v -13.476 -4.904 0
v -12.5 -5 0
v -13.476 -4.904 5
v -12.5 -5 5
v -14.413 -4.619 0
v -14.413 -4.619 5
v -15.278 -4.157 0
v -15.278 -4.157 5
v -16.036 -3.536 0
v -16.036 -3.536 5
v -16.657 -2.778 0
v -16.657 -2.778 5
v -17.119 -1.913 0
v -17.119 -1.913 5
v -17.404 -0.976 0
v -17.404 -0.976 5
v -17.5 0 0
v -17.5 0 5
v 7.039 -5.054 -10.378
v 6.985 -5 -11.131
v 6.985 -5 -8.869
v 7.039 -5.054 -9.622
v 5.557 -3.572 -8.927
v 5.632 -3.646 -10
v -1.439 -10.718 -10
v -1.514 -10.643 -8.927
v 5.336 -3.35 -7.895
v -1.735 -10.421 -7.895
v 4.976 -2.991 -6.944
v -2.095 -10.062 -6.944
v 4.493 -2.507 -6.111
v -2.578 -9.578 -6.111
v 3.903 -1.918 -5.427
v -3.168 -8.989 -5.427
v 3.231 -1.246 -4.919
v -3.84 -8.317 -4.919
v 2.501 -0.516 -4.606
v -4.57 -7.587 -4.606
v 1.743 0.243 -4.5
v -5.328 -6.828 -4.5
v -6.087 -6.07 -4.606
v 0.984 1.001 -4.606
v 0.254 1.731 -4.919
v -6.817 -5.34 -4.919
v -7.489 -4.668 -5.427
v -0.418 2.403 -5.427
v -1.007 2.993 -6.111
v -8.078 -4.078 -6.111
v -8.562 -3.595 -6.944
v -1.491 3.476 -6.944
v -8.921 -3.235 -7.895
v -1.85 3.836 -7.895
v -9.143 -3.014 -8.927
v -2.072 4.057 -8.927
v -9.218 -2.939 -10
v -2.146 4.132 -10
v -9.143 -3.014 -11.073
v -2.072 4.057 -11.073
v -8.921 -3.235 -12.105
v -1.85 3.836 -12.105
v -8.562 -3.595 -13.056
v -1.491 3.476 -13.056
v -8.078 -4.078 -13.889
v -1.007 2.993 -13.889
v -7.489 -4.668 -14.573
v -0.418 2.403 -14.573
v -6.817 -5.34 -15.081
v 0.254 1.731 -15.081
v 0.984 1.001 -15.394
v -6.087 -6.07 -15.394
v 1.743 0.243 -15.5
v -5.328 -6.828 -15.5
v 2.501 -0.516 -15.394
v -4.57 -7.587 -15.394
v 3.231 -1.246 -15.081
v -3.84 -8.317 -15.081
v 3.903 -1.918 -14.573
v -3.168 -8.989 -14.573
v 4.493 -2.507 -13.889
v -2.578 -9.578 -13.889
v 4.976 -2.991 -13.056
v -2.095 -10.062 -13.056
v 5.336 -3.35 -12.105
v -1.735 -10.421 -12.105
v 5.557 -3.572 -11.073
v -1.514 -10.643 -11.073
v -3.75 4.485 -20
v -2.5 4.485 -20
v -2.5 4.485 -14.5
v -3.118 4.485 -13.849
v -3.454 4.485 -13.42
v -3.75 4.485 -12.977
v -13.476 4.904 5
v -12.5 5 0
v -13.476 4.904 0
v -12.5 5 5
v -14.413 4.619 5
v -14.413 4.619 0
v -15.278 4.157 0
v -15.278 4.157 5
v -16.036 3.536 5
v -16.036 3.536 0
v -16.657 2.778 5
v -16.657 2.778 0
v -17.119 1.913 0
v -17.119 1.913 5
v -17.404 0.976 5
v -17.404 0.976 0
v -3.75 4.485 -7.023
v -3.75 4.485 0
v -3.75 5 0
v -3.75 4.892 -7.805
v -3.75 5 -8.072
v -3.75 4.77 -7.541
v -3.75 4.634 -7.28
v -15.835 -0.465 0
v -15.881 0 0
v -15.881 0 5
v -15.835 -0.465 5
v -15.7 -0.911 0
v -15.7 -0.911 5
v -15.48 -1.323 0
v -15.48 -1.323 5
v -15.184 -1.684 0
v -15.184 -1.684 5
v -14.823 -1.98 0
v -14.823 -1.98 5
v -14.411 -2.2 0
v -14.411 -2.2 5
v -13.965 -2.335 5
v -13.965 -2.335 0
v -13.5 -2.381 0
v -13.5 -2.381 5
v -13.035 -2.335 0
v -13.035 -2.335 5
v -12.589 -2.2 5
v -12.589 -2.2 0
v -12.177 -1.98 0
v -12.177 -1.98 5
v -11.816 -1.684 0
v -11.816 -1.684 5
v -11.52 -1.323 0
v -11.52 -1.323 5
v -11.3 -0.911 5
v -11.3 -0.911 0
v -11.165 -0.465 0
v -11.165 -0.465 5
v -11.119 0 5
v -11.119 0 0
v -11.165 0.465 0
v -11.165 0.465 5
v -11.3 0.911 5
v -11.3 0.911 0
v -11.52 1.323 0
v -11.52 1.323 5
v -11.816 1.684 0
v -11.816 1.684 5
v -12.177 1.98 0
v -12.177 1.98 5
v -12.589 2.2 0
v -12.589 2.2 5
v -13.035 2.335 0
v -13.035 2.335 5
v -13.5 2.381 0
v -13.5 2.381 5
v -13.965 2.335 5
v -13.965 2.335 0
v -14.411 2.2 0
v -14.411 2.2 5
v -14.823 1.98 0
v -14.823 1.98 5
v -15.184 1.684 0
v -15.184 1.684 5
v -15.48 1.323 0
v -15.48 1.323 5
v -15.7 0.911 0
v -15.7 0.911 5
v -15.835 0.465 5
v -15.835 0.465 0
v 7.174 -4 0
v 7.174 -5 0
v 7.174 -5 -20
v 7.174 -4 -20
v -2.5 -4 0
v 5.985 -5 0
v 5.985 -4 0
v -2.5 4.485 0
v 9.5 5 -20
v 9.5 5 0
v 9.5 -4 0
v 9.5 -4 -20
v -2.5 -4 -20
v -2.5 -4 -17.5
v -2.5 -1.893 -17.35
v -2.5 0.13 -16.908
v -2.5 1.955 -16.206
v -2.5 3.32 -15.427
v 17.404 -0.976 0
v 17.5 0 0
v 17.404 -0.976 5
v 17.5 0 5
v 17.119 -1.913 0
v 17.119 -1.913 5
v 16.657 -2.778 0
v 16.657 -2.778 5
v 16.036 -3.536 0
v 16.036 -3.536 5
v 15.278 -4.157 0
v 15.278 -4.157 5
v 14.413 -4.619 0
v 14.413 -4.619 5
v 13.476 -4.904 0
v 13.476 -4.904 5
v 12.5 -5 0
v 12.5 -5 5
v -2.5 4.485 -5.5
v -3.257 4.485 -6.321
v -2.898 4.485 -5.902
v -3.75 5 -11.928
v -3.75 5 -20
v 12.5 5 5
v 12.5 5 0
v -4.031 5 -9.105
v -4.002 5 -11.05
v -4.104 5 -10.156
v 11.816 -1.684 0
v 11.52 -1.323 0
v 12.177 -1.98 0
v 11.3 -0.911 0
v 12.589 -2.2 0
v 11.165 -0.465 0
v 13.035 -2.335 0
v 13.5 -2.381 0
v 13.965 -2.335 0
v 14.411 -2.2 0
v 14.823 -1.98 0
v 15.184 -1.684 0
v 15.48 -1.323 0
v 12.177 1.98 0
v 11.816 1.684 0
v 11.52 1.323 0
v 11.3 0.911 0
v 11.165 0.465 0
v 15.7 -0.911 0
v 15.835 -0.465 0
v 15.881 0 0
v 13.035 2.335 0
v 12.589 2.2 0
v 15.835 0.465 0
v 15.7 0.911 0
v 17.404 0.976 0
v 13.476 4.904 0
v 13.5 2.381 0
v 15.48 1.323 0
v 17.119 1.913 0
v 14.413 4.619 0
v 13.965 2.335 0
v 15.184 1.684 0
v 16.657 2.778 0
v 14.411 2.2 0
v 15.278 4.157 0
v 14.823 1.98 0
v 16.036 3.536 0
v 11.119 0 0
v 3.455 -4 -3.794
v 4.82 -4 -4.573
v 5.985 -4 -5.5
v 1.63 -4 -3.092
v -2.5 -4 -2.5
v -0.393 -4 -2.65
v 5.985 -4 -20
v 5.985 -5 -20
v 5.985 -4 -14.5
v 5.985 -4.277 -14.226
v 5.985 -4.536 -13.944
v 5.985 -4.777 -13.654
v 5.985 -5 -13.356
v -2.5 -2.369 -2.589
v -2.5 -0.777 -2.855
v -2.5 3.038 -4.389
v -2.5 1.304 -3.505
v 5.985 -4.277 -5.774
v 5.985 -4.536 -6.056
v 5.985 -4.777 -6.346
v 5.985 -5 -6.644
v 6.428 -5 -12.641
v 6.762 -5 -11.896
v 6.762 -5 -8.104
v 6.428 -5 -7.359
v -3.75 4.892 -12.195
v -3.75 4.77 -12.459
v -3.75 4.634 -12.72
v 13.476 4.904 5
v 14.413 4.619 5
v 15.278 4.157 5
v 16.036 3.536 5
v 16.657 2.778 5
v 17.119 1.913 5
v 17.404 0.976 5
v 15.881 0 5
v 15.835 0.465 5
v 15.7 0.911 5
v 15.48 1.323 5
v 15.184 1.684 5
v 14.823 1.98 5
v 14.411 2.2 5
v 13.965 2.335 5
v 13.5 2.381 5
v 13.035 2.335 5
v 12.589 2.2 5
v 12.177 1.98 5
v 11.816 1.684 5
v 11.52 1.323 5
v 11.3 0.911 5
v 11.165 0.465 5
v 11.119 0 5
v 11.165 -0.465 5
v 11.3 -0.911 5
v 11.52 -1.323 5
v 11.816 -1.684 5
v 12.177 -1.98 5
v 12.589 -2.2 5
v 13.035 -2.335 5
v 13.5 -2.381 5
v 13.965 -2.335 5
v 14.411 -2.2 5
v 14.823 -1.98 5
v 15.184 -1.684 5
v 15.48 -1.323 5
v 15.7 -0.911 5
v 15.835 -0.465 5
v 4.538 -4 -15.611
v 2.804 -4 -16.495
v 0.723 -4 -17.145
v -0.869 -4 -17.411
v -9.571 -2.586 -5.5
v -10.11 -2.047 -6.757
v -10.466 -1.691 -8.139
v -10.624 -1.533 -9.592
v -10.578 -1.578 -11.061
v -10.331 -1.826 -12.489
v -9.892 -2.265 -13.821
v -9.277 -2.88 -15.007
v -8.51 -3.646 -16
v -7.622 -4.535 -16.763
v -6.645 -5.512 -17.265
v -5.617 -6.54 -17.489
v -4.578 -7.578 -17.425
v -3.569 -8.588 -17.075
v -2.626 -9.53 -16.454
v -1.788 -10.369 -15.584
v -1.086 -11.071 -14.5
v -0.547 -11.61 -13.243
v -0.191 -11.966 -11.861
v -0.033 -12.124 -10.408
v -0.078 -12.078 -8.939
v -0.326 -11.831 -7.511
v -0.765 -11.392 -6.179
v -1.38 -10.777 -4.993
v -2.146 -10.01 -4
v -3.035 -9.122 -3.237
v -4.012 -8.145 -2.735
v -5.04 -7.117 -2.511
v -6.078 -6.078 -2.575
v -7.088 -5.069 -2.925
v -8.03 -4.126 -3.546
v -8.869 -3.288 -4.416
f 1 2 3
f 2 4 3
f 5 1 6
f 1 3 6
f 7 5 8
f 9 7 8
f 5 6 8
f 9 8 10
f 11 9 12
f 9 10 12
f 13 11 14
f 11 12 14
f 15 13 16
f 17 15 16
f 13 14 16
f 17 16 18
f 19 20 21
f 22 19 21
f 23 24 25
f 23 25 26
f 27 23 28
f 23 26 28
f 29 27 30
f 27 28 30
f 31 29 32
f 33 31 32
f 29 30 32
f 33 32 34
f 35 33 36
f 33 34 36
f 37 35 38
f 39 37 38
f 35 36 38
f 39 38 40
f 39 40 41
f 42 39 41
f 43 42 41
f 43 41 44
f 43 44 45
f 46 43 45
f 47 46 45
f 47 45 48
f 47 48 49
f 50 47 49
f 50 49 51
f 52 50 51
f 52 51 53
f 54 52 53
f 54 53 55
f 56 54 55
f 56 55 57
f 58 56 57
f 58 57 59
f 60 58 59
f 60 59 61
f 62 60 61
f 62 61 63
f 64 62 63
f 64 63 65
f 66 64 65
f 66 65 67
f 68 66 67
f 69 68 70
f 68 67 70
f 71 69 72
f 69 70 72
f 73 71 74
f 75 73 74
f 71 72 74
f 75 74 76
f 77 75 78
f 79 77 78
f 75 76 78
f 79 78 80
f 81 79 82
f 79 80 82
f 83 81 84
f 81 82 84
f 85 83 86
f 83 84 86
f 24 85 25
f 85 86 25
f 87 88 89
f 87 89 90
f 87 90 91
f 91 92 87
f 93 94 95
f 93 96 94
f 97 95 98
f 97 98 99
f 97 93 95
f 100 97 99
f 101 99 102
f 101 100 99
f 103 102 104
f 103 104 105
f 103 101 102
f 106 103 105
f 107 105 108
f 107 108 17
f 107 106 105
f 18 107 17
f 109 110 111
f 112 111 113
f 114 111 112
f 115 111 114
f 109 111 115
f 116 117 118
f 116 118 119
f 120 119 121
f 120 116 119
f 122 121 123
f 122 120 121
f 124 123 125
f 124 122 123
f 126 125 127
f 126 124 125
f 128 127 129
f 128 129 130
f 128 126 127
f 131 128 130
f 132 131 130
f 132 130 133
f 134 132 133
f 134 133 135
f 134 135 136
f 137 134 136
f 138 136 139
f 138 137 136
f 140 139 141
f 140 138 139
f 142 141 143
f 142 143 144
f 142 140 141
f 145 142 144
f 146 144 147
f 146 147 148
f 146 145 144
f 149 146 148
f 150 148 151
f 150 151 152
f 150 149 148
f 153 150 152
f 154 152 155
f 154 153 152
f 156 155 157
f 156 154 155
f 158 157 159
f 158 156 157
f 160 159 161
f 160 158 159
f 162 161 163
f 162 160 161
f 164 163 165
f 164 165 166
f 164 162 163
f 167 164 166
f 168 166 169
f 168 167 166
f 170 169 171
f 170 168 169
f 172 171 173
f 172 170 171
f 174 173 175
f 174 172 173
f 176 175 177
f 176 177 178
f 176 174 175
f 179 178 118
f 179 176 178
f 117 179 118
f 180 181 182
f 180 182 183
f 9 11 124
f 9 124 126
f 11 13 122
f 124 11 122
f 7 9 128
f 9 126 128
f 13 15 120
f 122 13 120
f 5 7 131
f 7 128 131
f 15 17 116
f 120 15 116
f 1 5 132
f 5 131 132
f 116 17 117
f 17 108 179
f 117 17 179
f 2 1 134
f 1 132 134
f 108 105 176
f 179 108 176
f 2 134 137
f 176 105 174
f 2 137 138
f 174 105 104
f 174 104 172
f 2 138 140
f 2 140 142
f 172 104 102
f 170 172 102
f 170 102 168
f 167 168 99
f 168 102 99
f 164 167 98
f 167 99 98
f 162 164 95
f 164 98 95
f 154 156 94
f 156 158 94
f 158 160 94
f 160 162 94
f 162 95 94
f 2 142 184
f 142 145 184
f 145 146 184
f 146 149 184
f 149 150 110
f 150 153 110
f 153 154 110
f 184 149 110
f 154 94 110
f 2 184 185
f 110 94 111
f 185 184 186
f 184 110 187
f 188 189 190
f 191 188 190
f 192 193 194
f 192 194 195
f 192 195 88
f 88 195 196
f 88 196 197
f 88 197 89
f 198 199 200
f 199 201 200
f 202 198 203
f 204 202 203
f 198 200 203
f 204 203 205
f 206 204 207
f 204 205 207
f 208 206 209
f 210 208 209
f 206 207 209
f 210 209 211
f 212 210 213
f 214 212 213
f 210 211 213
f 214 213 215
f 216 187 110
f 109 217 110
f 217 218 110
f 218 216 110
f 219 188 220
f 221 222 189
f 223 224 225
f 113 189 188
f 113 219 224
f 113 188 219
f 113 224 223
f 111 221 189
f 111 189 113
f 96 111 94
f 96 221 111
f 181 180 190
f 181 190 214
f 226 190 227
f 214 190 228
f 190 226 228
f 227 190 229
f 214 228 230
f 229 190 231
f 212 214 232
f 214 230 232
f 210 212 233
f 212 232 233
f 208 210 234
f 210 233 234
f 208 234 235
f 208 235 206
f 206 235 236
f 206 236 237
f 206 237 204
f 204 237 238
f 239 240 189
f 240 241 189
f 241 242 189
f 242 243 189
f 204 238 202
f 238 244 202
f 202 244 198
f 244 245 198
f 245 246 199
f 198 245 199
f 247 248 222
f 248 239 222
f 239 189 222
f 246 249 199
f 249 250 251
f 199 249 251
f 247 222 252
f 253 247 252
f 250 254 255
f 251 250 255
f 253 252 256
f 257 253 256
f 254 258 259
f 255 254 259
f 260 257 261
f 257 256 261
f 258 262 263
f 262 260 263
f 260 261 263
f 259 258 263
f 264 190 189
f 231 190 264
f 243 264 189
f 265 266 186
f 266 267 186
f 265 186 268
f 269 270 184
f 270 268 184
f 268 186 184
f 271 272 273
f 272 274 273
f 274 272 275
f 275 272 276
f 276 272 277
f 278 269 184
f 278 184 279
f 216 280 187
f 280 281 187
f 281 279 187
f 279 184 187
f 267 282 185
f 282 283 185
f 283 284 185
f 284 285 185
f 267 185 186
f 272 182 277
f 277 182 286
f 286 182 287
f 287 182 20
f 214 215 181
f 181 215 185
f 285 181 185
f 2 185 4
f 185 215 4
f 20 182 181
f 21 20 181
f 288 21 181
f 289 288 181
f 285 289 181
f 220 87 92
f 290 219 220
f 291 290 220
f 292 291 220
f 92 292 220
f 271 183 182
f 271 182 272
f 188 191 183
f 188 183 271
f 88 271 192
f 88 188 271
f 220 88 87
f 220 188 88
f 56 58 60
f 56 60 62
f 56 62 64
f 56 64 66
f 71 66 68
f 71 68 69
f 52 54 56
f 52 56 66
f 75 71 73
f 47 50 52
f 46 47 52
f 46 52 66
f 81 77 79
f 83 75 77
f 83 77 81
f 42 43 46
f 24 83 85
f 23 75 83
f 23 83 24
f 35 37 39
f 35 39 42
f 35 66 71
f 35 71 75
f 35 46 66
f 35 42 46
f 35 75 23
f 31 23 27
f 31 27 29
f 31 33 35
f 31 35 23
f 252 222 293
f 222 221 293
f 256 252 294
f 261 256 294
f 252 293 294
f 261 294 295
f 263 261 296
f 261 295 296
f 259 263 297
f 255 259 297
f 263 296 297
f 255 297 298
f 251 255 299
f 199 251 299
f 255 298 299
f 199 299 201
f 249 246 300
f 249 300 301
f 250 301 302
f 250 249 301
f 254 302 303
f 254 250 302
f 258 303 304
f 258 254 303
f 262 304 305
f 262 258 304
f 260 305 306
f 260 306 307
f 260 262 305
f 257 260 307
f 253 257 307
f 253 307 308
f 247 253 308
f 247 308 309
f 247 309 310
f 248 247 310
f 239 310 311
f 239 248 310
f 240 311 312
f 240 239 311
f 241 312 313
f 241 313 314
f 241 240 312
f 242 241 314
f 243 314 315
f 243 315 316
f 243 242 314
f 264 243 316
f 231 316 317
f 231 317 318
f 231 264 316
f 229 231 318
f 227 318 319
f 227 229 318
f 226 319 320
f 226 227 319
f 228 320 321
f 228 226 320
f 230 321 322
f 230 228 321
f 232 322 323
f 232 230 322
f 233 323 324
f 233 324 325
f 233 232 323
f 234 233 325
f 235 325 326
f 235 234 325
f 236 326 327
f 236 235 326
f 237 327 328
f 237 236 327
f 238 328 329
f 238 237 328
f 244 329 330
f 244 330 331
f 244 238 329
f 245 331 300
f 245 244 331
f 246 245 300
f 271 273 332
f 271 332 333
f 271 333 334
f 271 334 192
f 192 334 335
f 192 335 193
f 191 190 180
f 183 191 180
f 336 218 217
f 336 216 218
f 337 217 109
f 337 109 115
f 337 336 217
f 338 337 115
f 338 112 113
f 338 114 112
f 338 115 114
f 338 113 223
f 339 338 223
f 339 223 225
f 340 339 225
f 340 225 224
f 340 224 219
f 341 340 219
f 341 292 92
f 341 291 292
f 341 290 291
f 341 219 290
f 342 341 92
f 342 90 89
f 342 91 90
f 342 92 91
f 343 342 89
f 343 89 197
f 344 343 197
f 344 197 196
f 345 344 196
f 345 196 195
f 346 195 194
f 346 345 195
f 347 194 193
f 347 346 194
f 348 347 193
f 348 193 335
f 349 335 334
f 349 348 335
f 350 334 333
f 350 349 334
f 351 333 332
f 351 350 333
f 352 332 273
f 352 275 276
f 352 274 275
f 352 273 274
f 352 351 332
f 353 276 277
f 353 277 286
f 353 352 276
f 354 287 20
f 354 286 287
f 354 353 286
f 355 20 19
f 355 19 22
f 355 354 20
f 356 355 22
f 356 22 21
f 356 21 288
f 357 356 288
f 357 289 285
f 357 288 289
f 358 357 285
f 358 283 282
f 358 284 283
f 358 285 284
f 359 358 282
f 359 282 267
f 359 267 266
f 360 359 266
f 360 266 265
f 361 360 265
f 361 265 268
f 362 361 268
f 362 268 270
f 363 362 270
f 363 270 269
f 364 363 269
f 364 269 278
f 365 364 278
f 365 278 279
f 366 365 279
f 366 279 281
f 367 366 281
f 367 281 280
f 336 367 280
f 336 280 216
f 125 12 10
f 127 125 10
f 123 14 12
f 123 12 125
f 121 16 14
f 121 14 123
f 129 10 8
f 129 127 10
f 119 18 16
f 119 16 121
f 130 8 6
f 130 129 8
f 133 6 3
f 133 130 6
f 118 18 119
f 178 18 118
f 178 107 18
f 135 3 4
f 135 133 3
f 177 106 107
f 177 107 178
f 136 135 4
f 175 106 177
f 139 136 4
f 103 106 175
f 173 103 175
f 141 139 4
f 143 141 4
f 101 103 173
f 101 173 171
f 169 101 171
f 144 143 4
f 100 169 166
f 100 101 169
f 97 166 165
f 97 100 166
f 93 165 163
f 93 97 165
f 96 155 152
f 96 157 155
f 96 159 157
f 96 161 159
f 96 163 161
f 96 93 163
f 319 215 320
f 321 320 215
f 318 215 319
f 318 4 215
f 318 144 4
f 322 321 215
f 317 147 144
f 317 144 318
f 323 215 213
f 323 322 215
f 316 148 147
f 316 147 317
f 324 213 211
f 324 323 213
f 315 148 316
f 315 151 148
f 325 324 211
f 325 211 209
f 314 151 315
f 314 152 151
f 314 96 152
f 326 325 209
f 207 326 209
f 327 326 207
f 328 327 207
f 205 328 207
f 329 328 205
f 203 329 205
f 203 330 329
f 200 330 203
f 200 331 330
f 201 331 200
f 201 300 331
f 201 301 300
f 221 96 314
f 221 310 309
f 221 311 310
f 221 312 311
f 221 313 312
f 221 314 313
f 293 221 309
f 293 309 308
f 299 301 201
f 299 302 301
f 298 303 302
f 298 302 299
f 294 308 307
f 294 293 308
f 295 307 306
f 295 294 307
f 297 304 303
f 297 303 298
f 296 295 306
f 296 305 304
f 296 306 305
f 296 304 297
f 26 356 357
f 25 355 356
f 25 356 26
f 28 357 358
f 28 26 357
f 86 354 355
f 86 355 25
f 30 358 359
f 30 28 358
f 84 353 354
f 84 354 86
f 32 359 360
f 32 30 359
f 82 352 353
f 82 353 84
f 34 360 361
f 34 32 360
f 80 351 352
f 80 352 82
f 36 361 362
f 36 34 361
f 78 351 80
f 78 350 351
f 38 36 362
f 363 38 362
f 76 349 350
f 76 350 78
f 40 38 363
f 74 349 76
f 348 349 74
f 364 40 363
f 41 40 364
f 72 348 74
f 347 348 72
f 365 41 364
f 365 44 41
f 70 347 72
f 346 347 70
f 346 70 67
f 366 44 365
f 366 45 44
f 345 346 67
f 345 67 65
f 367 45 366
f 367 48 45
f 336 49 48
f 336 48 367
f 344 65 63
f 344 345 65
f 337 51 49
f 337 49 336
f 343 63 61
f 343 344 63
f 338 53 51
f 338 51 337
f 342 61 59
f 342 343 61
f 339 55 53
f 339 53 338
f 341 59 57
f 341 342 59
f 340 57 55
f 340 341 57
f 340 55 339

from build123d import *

# Parameters (mm, degrees)
SKETCH1_W           = 35
SKETCH1_H           = 10
SKETCH1_R           = 2.38125
BOSS_EXTRUDE1_DEPTH = 5
BOSS_EXTRUDE2_DEPTH = 20
SKETCH3_R           = 5.5
CUT_EXTRUDE1_DEPTH  = 6
BOSS_EXTRUDE3_START = 10
SKETCH4_R           = 7.5
SKETCH4_R_2         = 5.5
BOSS_EXTRUDE3_DEPTH = 10
FILLET1_R           = 5
BOSS_EXTRUDE4_START = -20
SKETCH5_W           = 1.25
SKETCH5_H           = 0.514718626
BOSS_EXTRUDE4_DEPTH = 20
SKETCH6_W           = 6.624212501
SKETCH6_H           = 0.612418682
CUT_EXTRUDE2_DEPTH  = 33.839440066
BOSS_EXTRUDE5_START = -20
SKETCH7_W           = 1.18849251
SKETCH7_H           = 1
BOSS_EXTRUDE5_DEPTH = 20


with BuildPart() as part:
    # Sketch1 → Boss-Extrude1 (new body)
    with BuildSketch(Plane.XY):
        Rectangle(SKETCH1_W, SKETCH1_H)
        with Locations((13.5, 0)):
            Circle(SKETCH1_R, mode=Mode.SUBTRACT)
        with Locations(Location((-13.5, 0, 0), (0, 0, 180))):
            Circle(SKETCH1_R, mode=Mode.SUBTRACT)
    extrude(amount=BOSS_EXTRUDE1_DEPTH)

    # Sketch2 → Boss-Extrude2 (add)
    with BuildSketch(Plane(origin=(0, 0, 0), x_dir=(-1, 0, 0), z_dir=(0, 0, -1))):
        Polygon((-9.5, -4), (2.5, -4), (2.5, 4), (2.5, 5), (-9.5, 5), (-9.5, 4), align=None)
    extrude(amount=BOSS_EXTRUDE2_DEPTH)

    # Sketch3 → Cut-Extrude1 (cut)
    with BuildSketch(Plane(origin=(-3.25, -3.25, 0), x_dir=(0, 0, 1), z_dir=(-0.7071067811865488, -0.7071067811865464, 0))):
        with Locations(Location((-10, -1.060660172, 0), (0, 0, 270))):
            Circle(SKETCH3_R)
    extrude(amount=-CUT_EXTRUDE1_DEPTH, mode=Mode.SUBTRACT)

    # Sketch4 → Boss-Extrude3 (add)
    with BuildSketch(Plane(origin=(0.992640687, 0.992640687, 0), x_dir=(0, 0, 1), z_dir=(-0.7071067811865488, -0.7071067811865462, 0)).offset(BOSS_EXTRUDE3_START)):
        with Locations(Location((-10, -1.060660172, 0), (0, 0, 53.130102354))):
            Circle(SKETCH4_R)
        with Locations(Location((-10, -1.060660172, 0), (0, 0, 270))):
            Circle(SKETCH4_R_2, mode=Mode.SUBTRACT)
    extrude(amount=-BOSS_EXTRUDE3_DEPTH)

    # Fillet1
    fillet1_edges = [part.edges().sort_by_distance(p)[0] for p in [
        (17.5, 5, 2.5),
        (17.5, -5, 2.5),
        (-17.5, -5, 2.5),
        (-17.5, 5, 2.5),
    ]]
    fillet(fillet1_edges, radius=FILLET1_R - 0.0001)  # a hair under: the kernel refuses the full size

    # Sketch5 → Boss-Extrude4 (add)
    with BuildSketch(Plane(origin=(0, 0, -20), x_dir=(-1, 0, 0), z_dir=(0, 0, -1)).offset(BOSS_EXTRUDE4_START)):
        with Locations((3.125, 4.742640687)):
            Rectangle(SKETCH5_W, SKETCH5_H)
    extrude(amount=BOSS_EXTRUDE4_DEPTH)

    # Sketch6 → Cut-Extrude2 (cut, through all)
    with BuildSketch(Plane(origin=(0, 0, -20), x_dir=(-1, 0, 0), z_dir=(0, 0, -1))):
        with Locations((6.326824877, 5.306209341)):
            Rectangle(SKETCH6_W, SKETCH6_H)
    extrude(amount=-CUT_EXTRUDE2_DEPTH, mode=Mode.SUBTRACT)

    # Sketch7 → Boss-Extrude5 (add)
    with BuildSketch(Plane(origin=(0, 0, -20), x_dir=(-1, 0, 0), z_dir=(0, 0, -1)).offset(BOSS_EXTRUDE5_START)):
        with Locations((-6.579527629, -4.5)):
            Rectangle(SKETCH7_W, SKETCH7_H)
    extrude(amount=BOSS_EXTRUDE5_DEPTH)


solid = part.part
